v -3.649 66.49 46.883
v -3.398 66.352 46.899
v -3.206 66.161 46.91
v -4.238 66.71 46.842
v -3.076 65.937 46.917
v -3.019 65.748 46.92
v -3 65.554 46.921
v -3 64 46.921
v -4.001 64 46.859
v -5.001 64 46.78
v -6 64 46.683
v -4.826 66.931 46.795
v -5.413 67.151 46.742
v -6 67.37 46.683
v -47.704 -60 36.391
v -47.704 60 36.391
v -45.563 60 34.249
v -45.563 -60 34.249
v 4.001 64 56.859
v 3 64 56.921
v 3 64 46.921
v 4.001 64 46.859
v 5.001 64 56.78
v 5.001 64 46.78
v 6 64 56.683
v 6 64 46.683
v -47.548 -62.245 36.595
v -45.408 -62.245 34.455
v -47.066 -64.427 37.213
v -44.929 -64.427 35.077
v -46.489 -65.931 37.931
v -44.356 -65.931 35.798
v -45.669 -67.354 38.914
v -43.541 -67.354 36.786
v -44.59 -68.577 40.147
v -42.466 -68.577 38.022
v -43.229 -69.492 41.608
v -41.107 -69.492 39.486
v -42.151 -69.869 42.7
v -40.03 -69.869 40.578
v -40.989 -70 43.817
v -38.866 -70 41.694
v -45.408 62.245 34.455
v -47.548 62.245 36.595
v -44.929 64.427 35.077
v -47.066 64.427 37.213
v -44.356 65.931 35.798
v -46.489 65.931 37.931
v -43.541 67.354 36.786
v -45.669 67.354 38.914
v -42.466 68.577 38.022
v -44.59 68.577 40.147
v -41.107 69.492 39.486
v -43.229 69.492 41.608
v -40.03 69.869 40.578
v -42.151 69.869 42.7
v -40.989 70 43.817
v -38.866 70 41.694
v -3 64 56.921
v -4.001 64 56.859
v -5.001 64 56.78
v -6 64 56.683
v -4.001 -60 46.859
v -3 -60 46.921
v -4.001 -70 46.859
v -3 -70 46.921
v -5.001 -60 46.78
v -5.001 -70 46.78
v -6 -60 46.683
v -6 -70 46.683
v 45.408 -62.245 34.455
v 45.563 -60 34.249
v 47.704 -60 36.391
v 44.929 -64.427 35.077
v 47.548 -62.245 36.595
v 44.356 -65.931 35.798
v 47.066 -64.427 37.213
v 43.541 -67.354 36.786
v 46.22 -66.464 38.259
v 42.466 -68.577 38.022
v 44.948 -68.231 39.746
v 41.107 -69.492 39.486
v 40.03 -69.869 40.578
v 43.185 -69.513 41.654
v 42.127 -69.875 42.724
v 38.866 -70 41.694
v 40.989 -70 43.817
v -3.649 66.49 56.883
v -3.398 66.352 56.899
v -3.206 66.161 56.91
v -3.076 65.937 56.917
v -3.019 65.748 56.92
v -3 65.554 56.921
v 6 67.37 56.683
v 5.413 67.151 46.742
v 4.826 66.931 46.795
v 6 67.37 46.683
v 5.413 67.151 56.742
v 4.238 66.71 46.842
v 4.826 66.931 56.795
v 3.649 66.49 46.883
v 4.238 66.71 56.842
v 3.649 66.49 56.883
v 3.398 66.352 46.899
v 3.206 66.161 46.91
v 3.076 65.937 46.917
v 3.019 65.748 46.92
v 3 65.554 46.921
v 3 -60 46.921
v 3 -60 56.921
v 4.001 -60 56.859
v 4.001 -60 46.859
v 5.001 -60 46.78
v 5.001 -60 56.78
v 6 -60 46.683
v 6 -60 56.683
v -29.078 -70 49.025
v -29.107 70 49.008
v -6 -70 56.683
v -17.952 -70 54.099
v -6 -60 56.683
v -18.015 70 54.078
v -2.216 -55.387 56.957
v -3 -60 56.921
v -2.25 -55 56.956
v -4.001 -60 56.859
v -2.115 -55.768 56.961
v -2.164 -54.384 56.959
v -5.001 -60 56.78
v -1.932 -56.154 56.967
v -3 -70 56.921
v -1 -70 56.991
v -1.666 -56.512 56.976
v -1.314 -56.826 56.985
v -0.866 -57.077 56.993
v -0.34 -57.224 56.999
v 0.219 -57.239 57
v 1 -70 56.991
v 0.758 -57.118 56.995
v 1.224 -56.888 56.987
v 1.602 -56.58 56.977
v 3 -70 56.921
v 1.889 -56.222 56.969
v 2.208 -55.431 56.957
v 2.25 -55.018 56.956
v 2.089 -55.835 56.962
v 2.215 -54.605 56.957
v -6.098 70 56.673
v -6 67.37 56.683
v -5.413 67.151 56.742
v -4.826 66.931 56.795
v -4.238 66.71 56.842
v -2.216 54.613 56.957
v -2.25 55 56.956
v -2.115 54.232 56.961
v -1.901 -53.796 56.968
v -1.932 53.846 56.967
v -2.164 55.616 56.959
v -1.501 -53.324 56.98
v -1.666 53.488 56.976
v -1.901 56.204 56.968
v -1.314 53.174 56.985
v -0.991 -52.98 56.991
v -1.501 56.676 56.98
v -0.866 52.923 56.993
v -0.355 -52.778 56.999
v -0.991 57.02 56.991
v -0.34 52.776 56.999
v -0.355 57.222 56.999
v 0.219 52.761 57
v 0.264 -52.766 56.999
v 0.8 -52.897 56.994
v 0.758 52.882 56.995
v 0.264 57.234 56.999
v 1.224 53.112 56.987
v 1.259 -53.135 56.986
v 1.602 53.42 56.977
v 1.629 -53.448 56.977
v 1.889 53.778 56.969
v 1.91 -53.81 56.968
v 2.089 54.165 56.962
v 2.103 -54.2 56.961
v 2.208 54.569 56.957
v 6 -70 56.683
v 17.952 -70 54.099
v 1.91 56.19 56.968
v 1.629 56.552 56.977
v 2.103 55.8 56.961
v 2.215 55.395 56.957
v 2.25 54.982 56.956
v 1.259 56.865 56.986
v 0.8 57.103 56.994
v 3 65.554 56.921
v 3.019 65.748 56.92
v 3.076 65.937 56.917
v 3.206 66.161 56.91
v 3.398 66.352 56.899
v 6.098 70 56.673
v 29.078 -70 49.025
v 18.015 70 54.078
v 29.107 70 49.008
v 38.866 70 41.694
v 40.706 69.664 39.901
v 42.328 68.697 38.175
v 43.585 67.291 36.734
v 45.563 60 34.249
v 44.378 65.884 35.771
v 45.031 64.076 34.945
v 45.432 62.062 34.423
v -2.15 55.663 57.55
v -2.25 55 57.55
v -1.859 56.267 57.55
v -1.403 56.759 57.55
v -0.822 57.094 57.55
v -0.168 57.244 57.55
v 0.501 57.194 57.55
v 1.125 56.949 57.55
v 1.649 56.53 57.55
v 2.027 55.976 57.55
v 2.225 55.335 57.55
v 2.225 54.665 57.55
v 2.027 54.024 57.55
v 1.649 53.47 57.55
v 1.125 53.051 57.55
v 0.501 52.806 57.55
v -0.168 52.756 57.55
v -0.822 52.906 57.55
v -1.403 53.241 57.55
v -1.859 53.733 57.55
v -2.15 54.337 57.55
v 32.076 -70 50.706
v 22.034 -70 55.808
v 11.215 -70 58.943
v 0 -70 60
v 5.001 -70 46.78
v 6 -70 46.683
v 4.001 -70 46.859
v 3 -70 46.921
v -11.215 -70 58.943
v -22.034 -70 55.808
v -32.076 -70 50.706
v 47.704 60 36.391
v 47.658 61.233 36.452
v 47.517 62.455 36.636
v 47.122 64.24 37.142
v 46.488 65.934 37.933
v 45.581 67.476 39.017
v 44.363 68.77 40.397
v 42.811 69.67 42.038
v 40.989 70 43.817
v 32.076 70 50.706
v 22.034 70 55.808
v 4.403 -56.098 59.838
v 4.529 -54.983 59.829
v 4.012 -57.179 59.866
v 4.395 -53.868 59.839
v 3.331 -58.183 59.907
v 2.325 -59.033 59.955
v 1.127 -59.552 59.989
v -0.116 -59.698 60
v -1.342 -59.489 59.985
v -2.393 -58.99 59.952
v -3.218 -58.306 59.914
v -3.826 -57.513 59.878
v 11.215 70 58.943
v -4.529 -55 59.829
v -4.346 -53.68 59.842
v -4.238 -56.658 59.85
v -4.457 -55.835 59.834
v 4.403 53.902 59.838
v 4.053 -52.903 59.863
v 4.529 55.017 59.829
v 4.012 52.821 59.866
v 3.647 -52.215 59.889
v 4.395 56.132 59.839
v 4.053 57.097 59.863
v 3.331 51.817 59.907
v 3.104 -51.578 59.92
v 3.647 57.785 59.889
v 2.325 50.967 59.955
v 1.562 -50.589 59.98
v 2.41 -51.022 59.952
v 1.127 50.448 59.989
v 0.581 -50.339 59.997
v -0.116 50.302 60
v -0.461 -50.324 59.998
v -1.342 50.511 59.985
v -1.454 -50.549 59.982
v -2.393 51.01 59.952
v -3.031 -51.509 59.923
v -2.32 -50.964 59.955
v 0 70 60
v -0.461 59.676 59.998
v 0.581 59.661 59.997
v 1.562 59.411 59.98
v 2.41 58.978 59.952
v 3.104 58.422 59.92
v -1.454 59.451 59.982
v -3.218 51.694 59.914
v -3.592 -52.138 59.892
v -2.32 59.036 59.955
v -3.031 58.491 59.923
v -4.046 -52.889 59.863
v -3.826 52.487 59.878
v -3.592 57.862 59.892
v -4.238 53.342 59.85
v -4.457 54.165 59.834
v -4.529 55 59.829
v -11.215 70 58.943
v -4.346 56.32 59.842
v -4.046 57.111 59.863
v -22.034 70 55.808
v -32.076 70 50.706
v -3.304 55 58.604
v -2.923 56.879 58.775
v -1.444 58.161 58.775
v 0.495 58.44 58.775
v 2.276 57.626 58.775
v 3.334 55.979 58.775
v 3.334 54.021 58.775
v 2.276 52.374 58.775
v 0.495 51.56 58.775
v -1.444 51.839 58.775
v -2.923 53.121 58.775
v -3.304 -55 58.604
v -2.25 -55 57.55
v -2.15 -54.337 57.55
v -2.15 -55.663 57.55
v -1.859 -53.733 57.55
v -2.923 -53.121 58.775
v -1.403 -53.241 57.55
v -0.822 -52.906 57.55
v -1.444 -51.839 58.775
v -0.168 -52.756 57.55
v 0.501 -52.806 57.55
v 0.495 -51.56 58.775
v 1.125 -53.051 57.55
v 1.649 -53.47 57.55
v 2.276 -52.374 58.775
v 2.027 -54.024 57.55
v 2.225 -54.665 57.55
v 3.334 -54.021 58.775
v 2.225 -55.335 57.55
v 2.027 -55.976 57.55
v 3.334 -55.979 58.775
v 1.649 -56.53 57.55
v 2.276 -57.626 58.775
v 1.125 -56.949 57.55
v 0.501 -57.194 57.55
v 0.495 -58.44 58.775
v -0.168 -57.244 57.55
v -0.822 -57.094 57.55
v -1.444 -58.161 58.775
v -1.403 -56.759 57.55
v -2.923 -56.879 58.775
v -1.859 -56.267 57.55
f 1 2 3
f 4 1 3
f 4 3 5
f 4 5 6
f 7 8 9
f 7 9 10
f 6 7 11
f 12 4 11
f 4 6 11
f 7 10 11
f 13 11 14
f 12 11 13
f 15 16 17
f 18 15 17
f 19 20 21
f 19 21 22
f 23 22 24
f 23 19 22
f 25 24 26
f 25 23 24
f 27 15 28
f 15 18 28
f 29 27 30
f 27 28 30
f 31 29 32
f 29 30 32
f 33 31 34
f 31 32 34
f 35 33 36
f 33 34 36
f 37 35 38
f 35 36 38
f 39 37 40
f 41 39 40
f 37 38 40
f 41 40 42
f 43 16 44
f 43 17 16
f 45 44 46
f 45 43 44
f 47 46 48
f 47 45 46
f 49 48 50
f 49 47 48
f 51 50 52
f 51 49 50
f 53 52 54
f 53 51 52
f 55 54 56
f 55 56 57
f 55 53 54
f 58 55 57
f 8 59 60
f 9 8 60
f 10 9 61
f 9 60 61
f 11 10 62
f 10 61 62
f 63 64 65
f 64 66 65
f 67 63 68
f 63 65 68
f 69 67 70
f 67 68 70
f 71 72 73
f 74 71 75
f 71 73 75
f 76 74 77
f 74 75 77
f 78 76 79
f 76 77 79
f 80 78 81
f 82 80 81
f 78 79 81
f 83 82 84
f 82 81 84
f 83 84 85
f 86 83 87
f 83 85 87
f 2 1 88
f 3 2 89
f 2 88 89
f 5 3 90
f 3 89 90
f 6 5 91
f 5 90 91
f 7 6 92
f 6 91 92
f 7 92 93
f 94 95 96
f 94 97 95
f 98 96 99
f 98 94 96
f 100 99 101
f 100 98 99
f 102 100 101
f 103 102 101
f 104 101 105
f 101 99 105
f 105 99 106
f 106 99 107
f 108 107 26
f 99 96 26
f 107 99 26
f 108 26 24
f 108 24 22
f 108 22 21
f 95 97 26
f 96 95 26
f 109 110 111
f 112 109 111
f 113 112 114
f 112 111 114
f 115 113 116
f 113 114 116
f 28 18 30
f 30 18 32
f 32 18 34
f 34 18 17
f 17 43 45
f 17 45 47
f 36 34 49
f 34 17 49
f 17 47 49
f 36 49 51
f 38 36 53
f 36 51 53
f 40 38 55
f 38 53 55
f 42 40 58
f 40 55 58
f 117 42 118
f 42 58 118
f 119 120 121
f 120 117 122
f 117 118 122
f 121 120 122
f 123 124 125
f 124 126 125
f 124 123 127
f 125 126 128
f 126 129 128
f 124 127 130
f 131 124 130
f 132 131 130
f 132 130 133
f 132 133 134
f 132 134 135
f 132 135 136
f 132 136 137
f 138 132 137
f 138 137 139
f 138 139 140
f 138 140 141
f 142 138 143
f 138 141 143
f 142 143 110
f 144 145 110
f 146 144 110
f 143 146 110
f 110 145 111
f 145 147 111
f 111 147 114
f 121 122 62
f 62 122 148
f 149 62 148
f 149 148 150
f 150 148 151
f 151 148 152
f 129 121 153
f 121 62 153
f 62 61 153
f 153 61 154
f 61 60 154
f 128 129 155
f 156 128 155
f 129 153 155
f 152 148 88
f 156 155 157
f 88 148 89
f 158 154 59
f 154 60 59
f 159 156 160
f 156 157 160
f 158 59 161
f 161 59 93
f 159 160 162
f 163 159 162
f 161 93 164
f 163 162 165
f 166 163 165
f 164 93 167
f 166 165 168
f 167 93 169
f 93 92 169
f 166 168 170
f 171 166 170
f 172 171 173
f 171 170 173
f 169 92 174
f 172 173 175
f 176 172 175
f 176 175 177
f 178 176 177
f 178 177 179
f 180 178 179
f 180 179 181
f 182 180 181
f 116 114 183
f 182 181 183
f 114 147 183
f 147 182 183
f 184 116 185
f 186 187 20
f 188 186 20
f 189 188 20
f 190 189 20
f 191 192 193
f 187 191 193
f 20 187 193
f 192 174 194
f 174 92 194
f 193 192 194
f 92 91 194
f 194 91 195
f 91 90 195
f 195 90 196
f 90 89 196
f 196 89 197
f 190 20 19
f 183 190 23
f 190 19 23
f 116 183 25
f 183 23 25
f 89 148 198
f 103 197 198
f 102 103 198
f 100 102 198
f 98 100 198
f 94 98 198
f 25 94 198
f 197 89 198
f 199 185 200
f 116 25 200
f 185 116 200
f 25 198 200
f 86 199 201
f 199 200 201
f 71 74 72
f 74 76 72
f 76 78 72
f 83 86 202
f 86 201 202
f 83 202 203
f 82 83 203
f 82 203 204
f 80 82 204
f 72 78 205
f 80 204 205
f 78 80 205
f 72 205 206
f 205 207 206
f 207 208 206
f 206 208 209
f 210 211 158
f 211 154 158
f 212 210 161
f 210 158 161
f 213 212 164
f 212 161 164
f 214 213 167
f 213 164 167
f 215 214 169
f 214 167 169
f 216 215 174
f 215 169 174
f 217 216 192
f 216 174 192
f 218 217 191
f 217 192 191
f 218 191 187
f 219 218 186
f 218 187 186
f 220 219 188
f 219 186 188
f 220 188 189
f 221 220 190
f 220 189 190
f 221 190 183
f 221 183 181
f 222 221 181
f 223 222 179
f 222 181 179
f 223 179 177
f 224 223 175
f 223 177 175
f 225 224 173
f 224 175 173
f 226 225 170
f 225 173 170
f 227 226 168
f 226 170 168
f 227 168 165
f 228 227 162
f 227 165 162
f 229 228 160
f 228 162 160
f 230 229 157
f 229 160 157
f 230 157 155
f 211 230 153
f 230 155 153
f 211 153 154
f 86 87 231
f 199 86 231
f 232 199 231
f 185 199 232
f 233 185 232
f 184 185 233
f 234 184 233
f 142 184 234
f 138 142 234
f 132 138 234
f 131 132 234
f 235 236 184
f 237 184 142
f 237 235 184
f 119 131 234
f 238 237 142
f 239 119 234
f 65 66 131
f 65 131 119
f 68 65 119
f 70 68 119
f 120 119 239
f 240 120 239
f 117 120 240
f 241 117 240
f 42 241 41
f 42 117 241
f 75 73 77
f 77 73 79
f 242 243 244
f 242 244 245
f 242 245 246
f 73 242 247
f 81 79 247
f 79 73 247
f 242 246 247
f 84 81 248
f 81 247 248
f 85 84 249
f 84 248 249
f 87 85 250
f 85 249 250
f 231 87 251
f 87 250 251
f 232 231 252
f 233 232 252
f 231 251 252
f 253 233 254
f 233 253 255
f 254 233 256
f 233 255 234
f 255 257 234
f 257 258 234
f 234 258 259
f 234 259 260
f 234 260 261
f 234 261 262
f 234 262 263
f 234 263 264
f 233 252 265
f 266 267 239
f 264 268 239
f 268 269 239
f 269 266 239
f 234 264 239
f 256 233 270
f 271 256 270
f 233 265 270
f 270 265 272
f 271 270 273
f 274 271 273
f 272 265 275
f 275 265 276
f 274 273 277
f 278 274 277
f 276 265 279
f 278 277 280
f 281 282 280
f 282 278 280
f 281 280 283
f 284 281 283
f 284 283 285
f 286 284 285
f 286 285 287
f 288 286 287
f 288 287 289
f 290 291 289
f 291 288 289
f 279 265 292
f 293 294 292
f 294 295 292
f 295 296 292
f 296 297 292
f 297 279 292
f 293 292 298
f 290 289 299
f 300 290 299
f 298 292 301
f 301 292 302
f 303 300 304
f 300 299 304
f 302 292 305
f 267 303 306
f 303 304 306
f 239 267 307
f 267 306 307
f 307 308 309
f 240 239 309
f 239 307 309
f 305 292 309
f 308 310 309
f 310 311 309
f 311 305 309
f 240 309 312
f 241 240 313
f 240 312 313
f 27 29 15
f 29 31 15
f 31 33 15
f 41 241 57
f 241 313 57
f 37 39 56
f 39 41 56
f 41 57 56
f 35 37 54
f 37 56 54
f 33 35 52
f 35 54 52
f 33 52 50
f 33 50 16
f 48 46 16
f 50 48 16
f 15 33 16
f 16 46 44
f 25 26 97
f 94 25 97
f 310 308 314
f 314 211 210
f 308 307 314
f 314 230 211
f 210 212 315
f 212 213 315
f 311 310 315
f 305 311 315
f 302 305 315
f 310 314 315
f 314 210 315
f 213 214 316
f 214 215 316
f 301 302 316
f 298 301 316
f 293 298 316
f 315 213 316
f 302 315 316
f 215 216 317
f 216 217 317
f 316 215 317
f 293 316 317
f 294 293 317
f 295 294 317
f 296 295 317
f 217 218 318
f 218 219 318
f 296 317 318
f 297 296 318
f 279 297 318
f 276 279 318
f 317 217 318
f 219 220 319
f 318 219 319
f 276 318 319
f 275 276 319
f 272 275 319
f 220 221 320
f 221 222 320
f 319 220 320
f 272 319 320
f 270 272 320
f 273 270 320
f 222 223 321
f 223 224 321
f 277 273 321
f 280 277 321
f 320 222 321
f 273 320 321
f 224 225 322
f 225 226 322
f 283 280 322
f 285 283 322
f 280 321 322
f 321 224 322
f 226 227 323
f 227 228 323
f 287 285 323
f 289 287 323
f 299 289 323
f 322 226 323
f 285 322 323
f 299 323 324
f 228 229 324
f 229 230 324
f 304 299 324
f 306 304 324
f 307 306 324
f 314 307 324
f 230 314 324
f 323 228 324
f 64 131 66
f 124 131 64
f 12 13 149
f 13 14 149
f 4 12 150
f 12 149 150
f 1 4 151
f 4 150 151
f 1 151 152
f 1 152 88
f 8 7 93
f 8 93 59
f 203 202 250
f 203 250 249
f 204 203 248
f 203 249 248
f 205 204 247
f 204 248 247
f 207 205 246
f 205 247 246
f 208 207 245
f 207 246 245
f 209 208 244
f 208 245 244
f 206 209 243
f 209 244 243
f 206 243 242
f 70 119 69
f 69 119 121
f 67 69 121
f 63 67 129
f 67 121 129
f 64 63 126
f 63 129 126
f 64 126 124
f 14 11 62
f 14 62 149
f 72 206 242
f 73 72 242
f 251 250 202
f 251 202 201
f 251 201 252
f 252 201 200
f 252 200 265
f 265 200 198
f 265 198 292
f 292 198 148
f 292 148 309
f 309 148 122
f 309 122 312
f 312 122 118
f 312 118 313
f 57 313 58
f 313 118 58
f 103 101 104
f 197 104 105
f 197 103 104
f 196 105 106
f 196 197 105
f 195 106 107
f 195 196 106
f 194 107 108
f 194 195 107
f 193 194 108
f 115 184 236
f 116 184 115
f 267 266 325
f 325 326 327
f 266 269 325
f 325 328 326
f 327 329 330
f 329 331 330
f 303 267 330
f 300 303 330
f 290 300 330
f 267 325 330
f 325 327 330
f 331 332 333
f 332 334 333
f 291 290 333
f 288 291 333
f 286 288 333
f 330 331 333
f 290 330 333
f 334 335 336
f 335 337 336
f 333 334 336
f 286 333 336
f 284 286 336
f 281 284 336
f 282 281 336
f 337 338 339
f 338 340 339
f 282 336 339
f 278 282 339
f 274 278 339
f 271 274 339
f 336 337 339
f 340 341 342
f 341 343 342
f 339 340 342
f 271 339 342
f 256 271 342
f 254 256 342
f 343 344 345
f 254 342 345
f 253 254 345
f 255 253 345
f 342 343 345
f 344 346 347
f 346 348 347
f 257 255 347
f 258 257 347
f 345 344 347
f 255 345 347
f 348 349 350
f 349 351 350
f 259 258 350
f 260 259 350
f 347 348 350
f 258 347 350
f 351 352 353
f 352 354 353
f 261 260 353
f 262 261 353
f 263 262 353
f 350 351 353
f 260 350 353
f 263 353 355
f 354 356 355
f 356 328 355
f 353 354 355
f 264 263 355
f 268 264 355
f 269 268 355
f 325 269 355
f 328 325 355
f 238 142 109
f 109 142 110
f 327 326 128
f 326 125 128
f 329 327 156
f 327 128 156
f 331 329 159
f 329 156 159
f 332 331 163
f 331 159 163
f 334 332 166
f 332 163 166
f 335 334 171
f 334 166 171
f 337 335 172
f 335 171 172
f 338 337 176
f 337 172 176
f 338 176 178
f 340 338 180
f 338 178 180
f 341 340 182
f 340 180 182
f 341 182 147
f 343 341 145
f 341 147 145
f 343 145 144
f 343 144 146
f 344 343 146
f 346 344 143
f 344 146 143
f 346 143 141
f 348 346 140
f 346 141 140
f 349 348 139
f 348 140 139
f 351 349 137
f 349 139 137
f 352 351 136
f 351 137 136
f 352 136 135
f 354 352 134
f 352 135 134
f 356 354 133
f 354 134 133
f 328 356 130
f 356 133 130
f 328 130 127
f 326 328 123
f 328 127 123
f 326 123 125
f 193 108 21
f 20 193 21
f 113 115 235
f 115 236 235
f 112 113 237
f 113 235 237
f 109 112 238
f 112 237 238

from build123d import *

# Parameters (mm, degrees)
BOSS_EXTRUDE1_DEPTH                                 = 70
BOSS_EXTRUDE2_REACH                                 = 115.806
BOSS_EXTRUDE2_START_RADIUS                          = 57
BOSS_EXTRUDE2_END_RADIUS                            = 57
SKETCH7_W                                           = 3
SKETCH7_H                                           = 10
CSK_FOR_M4_COUNTERSUNK_FLAT_HEAD_SCREW2_D           = 4.5
CSK_FOR_M4_COUNTERSUNK_FLAT_HEAD_SCREW2_DEPTH       = 11.5
CSK_FOR_M4_COUNTERSUNK_FLAT_HEAD_SCREW2_CSINK_D     = 9.4
CSK_FOR_M4_COUNTERSUNK_FLAT_HEAD_SCREW2_CSINK_ANGLE = 90
CSK_FOR_M4_COUNTERSUNK_FLAT_HEAD_SCREW2_TIP         = 1.351936393
FILLET1_R                                           = 10


with BuildPart() as part:
    # Sketch2 → Boss-Extrude1 (new, symmetric)
    with BuildSketch(Plane(origin=(0, 0, 0), x_dir=(1, 0, 0), z_dir=(0, 1, 0))):
        with BuildLine():
            Line((-47.704446333, -36.390737834), (-45.562994128, -34.249285629))
            ThreePointArc((-45.562994128, -34.249285629), (0, -57), (45.562994128, -34.249285629))
            Line((45.562994128, -34.249285629), (47.704446333, -36.390737834))
            ThreePointArc((47.704446333, -36.390737834), (0, -60), (-47.704446333, -36.390737834))
        make_face()
    extrude(amount=BOSS_EXTRUDE1_DEPTH, both=True)

    # Boss-Extrude2: from a cylinder face, 115.806 long prism both ways, kept between that surface and its translate by the depth
    boss_extrude2_start = Plane(origin=(0, 0.207736, 0), z_dir=(0, -1, 0)) * Cylinder(BOSS_EXTRUDE2_START_RADIUS, 477.027472, mode=Mode.PRIVATE)
    boss_extrude2_end = Plane(origin=(0, 0.207736, -10), z_dir=(0, -1, 0)) * Cylinder(BOSS_EXTRUDE2_END_RADIUS, 477.027472, mode=Mode.PRIVATE)
    # Sketch7 → Boss-Extrude2 (add, from a surface)
    with BuildSketch(Plane.XY, mode=Mode.PRIVATE) as boss_extrude2_sk1:
        with Locations((4.5, -65)):
            Rectangle(SKETCH7_W, SKETCH7_H)
    boss_extrude2_tool1 = extrude(boss_extrude2_sk1.sketch, amount=BOSS_EXTRUDE2_REACH, both=True, mode=Mode.PRIVATE)
    add(((boss_extrude2_tool1 & boss_extrude2_start) - boss_extrude2_end).solids().sort_by_distance((4.5, -65, 51.802164))[0])
    # Sketch7 → Boss-Extrude2 (add, from a surface)
    with BuildSketch(Plane.XY, mode=Mode.PRIVATE) as boss_extrude2_sk2:
        with BuildLine():
            Line((3, 65.553629026), (3, 64))
            Line((3, 64), (6, 64))
            Line((6, 64), (6, 67.370437785))
            Line((6, 67.370437785), (3.649292783, 66.490114182))
            ThreePointArc((3.649292783, 66.490114182), (3.178200993, 66.123406518), (3, 65.553629026))
        make_face()
    boss_extrude2_tool2 = extrude(boss_extrude2_sk2.sketch, amount=BOSS_EXTRUDE2_REACH, both=True, mode=Mode.PRIVATE)
    add(((boss_extrude2_tool2 & boss_extrude2_start) - boss_extrude2_end).solids().sort_by_distance((4.5, -65, 51.802164))[0])
    # Sketch7 → Boss-Extrude2 (add, from a surface)
    with BuildSketch(Plane.XY, mode=Mode.PRIVATE) as boss_extrude2_sk3:
        with BuildLine():
            Line((-3, 65.553629026), (-3, 64))
            Line((-3, 64), (-6, 64))
            Line((-6, 64), (-6, 67.370437785))
            Line((-6, 67.370437785), (-3.649292783, 66.490114182))
            ThreePointArc((-3.649292783, 66.490114182), (-3.178200993, 66.123406518), (-3, 65.553629026))
        make_face()
    boss_extrude2_tool3 = extrude(boss_extrude2_sk3.sketch, amount=BOSS_EXTRUDE2_REACH, both=True, mode=Mode.PRIVATE)
    add(((boss_extrude2_tool3 & boss_extrude2_start) - boss_extrude2_end).solids().sort_by_distance((4.5, -65, 51.802164))[0])
    # Sketch7 → Boss-Extrude2 (add, from a surface)
    with BuildSketch(Plane.XY, mode=Mode.PRIVATE) as boss_extrude2_sk4:
        with Locations((-4.5, -65)):
            Rectangle(SKETCH7_W, SKETCH7_H)
    boss_extrude2_tool4 = extrude(boss_extrude2_sk4.sketch, amount=BOSS_EXTRUDE2_REACH, both=True, mode=Mode.PRIVATE)
    add(((boss_extrude2_tool4 & boss_extrude2_start) - boss_extrude2_end).solids().sort_by_distance((4.5, -65, 51.802164))[0])

    # CSK for M4 Countersunk Flat Head Screw2
    with Locations(Plane(origin=(0, 55, 60), x_dir=(1, 0, 0), z_dir=(0, 0, 1))):
        with Locations((0, 0), (0, -110)):
            CounterSinkHole(CSK_FOR_M4_COUNTERSUNK_FLAT_HEAD_SCREW2_D / 2, CSK_FOR_M4_COUNTERSUNK_FLAT_HEAD_SCREW2_CSINK_D / 2, depth=CSK_FOR_M4_COUNTERSUNK_FLAT_HEAD_SCREW2_DEPTH, counter_sink_angle=CSK_FOR_M4_COUNTERSUNK_FLAT_HEAD_SCREW2_CSINK_ANGLE)
            with Locations((0, 0, -(CSK_FOR_M4_COUNTERSUNK_FLAT_HEAD_SCREW2_DEPTH + CSK_FOR_M4_COUNTERSUNK_FLAT_HEAD_SCREW2_TIP / 2))):  # 118° drill point
                Cone(0, CSK_FOR_M4_COUNTERSUNK_FLAT_HEAD_SCREW2_D / 2, CSK_FOR_M4_COUNTERSUNK_FLAT_HEAD_SCREW2_TIP, mode=Mode.SUBTRACT)

    # Fillet1
    fillet1_edges = [part.edges().sort_by_distance(p)[0] for p in [
        (-46.63372023, 70, 35.320011731),
        (-46.63372023, -70, 35.320011731),
        (46.63372023, -70, 35.320011731),
        (46.63372023, 70, 35.320011731),
    ]]
    fillet(fillet1_edges, radius=FILLET1_R)


solid = part.part
